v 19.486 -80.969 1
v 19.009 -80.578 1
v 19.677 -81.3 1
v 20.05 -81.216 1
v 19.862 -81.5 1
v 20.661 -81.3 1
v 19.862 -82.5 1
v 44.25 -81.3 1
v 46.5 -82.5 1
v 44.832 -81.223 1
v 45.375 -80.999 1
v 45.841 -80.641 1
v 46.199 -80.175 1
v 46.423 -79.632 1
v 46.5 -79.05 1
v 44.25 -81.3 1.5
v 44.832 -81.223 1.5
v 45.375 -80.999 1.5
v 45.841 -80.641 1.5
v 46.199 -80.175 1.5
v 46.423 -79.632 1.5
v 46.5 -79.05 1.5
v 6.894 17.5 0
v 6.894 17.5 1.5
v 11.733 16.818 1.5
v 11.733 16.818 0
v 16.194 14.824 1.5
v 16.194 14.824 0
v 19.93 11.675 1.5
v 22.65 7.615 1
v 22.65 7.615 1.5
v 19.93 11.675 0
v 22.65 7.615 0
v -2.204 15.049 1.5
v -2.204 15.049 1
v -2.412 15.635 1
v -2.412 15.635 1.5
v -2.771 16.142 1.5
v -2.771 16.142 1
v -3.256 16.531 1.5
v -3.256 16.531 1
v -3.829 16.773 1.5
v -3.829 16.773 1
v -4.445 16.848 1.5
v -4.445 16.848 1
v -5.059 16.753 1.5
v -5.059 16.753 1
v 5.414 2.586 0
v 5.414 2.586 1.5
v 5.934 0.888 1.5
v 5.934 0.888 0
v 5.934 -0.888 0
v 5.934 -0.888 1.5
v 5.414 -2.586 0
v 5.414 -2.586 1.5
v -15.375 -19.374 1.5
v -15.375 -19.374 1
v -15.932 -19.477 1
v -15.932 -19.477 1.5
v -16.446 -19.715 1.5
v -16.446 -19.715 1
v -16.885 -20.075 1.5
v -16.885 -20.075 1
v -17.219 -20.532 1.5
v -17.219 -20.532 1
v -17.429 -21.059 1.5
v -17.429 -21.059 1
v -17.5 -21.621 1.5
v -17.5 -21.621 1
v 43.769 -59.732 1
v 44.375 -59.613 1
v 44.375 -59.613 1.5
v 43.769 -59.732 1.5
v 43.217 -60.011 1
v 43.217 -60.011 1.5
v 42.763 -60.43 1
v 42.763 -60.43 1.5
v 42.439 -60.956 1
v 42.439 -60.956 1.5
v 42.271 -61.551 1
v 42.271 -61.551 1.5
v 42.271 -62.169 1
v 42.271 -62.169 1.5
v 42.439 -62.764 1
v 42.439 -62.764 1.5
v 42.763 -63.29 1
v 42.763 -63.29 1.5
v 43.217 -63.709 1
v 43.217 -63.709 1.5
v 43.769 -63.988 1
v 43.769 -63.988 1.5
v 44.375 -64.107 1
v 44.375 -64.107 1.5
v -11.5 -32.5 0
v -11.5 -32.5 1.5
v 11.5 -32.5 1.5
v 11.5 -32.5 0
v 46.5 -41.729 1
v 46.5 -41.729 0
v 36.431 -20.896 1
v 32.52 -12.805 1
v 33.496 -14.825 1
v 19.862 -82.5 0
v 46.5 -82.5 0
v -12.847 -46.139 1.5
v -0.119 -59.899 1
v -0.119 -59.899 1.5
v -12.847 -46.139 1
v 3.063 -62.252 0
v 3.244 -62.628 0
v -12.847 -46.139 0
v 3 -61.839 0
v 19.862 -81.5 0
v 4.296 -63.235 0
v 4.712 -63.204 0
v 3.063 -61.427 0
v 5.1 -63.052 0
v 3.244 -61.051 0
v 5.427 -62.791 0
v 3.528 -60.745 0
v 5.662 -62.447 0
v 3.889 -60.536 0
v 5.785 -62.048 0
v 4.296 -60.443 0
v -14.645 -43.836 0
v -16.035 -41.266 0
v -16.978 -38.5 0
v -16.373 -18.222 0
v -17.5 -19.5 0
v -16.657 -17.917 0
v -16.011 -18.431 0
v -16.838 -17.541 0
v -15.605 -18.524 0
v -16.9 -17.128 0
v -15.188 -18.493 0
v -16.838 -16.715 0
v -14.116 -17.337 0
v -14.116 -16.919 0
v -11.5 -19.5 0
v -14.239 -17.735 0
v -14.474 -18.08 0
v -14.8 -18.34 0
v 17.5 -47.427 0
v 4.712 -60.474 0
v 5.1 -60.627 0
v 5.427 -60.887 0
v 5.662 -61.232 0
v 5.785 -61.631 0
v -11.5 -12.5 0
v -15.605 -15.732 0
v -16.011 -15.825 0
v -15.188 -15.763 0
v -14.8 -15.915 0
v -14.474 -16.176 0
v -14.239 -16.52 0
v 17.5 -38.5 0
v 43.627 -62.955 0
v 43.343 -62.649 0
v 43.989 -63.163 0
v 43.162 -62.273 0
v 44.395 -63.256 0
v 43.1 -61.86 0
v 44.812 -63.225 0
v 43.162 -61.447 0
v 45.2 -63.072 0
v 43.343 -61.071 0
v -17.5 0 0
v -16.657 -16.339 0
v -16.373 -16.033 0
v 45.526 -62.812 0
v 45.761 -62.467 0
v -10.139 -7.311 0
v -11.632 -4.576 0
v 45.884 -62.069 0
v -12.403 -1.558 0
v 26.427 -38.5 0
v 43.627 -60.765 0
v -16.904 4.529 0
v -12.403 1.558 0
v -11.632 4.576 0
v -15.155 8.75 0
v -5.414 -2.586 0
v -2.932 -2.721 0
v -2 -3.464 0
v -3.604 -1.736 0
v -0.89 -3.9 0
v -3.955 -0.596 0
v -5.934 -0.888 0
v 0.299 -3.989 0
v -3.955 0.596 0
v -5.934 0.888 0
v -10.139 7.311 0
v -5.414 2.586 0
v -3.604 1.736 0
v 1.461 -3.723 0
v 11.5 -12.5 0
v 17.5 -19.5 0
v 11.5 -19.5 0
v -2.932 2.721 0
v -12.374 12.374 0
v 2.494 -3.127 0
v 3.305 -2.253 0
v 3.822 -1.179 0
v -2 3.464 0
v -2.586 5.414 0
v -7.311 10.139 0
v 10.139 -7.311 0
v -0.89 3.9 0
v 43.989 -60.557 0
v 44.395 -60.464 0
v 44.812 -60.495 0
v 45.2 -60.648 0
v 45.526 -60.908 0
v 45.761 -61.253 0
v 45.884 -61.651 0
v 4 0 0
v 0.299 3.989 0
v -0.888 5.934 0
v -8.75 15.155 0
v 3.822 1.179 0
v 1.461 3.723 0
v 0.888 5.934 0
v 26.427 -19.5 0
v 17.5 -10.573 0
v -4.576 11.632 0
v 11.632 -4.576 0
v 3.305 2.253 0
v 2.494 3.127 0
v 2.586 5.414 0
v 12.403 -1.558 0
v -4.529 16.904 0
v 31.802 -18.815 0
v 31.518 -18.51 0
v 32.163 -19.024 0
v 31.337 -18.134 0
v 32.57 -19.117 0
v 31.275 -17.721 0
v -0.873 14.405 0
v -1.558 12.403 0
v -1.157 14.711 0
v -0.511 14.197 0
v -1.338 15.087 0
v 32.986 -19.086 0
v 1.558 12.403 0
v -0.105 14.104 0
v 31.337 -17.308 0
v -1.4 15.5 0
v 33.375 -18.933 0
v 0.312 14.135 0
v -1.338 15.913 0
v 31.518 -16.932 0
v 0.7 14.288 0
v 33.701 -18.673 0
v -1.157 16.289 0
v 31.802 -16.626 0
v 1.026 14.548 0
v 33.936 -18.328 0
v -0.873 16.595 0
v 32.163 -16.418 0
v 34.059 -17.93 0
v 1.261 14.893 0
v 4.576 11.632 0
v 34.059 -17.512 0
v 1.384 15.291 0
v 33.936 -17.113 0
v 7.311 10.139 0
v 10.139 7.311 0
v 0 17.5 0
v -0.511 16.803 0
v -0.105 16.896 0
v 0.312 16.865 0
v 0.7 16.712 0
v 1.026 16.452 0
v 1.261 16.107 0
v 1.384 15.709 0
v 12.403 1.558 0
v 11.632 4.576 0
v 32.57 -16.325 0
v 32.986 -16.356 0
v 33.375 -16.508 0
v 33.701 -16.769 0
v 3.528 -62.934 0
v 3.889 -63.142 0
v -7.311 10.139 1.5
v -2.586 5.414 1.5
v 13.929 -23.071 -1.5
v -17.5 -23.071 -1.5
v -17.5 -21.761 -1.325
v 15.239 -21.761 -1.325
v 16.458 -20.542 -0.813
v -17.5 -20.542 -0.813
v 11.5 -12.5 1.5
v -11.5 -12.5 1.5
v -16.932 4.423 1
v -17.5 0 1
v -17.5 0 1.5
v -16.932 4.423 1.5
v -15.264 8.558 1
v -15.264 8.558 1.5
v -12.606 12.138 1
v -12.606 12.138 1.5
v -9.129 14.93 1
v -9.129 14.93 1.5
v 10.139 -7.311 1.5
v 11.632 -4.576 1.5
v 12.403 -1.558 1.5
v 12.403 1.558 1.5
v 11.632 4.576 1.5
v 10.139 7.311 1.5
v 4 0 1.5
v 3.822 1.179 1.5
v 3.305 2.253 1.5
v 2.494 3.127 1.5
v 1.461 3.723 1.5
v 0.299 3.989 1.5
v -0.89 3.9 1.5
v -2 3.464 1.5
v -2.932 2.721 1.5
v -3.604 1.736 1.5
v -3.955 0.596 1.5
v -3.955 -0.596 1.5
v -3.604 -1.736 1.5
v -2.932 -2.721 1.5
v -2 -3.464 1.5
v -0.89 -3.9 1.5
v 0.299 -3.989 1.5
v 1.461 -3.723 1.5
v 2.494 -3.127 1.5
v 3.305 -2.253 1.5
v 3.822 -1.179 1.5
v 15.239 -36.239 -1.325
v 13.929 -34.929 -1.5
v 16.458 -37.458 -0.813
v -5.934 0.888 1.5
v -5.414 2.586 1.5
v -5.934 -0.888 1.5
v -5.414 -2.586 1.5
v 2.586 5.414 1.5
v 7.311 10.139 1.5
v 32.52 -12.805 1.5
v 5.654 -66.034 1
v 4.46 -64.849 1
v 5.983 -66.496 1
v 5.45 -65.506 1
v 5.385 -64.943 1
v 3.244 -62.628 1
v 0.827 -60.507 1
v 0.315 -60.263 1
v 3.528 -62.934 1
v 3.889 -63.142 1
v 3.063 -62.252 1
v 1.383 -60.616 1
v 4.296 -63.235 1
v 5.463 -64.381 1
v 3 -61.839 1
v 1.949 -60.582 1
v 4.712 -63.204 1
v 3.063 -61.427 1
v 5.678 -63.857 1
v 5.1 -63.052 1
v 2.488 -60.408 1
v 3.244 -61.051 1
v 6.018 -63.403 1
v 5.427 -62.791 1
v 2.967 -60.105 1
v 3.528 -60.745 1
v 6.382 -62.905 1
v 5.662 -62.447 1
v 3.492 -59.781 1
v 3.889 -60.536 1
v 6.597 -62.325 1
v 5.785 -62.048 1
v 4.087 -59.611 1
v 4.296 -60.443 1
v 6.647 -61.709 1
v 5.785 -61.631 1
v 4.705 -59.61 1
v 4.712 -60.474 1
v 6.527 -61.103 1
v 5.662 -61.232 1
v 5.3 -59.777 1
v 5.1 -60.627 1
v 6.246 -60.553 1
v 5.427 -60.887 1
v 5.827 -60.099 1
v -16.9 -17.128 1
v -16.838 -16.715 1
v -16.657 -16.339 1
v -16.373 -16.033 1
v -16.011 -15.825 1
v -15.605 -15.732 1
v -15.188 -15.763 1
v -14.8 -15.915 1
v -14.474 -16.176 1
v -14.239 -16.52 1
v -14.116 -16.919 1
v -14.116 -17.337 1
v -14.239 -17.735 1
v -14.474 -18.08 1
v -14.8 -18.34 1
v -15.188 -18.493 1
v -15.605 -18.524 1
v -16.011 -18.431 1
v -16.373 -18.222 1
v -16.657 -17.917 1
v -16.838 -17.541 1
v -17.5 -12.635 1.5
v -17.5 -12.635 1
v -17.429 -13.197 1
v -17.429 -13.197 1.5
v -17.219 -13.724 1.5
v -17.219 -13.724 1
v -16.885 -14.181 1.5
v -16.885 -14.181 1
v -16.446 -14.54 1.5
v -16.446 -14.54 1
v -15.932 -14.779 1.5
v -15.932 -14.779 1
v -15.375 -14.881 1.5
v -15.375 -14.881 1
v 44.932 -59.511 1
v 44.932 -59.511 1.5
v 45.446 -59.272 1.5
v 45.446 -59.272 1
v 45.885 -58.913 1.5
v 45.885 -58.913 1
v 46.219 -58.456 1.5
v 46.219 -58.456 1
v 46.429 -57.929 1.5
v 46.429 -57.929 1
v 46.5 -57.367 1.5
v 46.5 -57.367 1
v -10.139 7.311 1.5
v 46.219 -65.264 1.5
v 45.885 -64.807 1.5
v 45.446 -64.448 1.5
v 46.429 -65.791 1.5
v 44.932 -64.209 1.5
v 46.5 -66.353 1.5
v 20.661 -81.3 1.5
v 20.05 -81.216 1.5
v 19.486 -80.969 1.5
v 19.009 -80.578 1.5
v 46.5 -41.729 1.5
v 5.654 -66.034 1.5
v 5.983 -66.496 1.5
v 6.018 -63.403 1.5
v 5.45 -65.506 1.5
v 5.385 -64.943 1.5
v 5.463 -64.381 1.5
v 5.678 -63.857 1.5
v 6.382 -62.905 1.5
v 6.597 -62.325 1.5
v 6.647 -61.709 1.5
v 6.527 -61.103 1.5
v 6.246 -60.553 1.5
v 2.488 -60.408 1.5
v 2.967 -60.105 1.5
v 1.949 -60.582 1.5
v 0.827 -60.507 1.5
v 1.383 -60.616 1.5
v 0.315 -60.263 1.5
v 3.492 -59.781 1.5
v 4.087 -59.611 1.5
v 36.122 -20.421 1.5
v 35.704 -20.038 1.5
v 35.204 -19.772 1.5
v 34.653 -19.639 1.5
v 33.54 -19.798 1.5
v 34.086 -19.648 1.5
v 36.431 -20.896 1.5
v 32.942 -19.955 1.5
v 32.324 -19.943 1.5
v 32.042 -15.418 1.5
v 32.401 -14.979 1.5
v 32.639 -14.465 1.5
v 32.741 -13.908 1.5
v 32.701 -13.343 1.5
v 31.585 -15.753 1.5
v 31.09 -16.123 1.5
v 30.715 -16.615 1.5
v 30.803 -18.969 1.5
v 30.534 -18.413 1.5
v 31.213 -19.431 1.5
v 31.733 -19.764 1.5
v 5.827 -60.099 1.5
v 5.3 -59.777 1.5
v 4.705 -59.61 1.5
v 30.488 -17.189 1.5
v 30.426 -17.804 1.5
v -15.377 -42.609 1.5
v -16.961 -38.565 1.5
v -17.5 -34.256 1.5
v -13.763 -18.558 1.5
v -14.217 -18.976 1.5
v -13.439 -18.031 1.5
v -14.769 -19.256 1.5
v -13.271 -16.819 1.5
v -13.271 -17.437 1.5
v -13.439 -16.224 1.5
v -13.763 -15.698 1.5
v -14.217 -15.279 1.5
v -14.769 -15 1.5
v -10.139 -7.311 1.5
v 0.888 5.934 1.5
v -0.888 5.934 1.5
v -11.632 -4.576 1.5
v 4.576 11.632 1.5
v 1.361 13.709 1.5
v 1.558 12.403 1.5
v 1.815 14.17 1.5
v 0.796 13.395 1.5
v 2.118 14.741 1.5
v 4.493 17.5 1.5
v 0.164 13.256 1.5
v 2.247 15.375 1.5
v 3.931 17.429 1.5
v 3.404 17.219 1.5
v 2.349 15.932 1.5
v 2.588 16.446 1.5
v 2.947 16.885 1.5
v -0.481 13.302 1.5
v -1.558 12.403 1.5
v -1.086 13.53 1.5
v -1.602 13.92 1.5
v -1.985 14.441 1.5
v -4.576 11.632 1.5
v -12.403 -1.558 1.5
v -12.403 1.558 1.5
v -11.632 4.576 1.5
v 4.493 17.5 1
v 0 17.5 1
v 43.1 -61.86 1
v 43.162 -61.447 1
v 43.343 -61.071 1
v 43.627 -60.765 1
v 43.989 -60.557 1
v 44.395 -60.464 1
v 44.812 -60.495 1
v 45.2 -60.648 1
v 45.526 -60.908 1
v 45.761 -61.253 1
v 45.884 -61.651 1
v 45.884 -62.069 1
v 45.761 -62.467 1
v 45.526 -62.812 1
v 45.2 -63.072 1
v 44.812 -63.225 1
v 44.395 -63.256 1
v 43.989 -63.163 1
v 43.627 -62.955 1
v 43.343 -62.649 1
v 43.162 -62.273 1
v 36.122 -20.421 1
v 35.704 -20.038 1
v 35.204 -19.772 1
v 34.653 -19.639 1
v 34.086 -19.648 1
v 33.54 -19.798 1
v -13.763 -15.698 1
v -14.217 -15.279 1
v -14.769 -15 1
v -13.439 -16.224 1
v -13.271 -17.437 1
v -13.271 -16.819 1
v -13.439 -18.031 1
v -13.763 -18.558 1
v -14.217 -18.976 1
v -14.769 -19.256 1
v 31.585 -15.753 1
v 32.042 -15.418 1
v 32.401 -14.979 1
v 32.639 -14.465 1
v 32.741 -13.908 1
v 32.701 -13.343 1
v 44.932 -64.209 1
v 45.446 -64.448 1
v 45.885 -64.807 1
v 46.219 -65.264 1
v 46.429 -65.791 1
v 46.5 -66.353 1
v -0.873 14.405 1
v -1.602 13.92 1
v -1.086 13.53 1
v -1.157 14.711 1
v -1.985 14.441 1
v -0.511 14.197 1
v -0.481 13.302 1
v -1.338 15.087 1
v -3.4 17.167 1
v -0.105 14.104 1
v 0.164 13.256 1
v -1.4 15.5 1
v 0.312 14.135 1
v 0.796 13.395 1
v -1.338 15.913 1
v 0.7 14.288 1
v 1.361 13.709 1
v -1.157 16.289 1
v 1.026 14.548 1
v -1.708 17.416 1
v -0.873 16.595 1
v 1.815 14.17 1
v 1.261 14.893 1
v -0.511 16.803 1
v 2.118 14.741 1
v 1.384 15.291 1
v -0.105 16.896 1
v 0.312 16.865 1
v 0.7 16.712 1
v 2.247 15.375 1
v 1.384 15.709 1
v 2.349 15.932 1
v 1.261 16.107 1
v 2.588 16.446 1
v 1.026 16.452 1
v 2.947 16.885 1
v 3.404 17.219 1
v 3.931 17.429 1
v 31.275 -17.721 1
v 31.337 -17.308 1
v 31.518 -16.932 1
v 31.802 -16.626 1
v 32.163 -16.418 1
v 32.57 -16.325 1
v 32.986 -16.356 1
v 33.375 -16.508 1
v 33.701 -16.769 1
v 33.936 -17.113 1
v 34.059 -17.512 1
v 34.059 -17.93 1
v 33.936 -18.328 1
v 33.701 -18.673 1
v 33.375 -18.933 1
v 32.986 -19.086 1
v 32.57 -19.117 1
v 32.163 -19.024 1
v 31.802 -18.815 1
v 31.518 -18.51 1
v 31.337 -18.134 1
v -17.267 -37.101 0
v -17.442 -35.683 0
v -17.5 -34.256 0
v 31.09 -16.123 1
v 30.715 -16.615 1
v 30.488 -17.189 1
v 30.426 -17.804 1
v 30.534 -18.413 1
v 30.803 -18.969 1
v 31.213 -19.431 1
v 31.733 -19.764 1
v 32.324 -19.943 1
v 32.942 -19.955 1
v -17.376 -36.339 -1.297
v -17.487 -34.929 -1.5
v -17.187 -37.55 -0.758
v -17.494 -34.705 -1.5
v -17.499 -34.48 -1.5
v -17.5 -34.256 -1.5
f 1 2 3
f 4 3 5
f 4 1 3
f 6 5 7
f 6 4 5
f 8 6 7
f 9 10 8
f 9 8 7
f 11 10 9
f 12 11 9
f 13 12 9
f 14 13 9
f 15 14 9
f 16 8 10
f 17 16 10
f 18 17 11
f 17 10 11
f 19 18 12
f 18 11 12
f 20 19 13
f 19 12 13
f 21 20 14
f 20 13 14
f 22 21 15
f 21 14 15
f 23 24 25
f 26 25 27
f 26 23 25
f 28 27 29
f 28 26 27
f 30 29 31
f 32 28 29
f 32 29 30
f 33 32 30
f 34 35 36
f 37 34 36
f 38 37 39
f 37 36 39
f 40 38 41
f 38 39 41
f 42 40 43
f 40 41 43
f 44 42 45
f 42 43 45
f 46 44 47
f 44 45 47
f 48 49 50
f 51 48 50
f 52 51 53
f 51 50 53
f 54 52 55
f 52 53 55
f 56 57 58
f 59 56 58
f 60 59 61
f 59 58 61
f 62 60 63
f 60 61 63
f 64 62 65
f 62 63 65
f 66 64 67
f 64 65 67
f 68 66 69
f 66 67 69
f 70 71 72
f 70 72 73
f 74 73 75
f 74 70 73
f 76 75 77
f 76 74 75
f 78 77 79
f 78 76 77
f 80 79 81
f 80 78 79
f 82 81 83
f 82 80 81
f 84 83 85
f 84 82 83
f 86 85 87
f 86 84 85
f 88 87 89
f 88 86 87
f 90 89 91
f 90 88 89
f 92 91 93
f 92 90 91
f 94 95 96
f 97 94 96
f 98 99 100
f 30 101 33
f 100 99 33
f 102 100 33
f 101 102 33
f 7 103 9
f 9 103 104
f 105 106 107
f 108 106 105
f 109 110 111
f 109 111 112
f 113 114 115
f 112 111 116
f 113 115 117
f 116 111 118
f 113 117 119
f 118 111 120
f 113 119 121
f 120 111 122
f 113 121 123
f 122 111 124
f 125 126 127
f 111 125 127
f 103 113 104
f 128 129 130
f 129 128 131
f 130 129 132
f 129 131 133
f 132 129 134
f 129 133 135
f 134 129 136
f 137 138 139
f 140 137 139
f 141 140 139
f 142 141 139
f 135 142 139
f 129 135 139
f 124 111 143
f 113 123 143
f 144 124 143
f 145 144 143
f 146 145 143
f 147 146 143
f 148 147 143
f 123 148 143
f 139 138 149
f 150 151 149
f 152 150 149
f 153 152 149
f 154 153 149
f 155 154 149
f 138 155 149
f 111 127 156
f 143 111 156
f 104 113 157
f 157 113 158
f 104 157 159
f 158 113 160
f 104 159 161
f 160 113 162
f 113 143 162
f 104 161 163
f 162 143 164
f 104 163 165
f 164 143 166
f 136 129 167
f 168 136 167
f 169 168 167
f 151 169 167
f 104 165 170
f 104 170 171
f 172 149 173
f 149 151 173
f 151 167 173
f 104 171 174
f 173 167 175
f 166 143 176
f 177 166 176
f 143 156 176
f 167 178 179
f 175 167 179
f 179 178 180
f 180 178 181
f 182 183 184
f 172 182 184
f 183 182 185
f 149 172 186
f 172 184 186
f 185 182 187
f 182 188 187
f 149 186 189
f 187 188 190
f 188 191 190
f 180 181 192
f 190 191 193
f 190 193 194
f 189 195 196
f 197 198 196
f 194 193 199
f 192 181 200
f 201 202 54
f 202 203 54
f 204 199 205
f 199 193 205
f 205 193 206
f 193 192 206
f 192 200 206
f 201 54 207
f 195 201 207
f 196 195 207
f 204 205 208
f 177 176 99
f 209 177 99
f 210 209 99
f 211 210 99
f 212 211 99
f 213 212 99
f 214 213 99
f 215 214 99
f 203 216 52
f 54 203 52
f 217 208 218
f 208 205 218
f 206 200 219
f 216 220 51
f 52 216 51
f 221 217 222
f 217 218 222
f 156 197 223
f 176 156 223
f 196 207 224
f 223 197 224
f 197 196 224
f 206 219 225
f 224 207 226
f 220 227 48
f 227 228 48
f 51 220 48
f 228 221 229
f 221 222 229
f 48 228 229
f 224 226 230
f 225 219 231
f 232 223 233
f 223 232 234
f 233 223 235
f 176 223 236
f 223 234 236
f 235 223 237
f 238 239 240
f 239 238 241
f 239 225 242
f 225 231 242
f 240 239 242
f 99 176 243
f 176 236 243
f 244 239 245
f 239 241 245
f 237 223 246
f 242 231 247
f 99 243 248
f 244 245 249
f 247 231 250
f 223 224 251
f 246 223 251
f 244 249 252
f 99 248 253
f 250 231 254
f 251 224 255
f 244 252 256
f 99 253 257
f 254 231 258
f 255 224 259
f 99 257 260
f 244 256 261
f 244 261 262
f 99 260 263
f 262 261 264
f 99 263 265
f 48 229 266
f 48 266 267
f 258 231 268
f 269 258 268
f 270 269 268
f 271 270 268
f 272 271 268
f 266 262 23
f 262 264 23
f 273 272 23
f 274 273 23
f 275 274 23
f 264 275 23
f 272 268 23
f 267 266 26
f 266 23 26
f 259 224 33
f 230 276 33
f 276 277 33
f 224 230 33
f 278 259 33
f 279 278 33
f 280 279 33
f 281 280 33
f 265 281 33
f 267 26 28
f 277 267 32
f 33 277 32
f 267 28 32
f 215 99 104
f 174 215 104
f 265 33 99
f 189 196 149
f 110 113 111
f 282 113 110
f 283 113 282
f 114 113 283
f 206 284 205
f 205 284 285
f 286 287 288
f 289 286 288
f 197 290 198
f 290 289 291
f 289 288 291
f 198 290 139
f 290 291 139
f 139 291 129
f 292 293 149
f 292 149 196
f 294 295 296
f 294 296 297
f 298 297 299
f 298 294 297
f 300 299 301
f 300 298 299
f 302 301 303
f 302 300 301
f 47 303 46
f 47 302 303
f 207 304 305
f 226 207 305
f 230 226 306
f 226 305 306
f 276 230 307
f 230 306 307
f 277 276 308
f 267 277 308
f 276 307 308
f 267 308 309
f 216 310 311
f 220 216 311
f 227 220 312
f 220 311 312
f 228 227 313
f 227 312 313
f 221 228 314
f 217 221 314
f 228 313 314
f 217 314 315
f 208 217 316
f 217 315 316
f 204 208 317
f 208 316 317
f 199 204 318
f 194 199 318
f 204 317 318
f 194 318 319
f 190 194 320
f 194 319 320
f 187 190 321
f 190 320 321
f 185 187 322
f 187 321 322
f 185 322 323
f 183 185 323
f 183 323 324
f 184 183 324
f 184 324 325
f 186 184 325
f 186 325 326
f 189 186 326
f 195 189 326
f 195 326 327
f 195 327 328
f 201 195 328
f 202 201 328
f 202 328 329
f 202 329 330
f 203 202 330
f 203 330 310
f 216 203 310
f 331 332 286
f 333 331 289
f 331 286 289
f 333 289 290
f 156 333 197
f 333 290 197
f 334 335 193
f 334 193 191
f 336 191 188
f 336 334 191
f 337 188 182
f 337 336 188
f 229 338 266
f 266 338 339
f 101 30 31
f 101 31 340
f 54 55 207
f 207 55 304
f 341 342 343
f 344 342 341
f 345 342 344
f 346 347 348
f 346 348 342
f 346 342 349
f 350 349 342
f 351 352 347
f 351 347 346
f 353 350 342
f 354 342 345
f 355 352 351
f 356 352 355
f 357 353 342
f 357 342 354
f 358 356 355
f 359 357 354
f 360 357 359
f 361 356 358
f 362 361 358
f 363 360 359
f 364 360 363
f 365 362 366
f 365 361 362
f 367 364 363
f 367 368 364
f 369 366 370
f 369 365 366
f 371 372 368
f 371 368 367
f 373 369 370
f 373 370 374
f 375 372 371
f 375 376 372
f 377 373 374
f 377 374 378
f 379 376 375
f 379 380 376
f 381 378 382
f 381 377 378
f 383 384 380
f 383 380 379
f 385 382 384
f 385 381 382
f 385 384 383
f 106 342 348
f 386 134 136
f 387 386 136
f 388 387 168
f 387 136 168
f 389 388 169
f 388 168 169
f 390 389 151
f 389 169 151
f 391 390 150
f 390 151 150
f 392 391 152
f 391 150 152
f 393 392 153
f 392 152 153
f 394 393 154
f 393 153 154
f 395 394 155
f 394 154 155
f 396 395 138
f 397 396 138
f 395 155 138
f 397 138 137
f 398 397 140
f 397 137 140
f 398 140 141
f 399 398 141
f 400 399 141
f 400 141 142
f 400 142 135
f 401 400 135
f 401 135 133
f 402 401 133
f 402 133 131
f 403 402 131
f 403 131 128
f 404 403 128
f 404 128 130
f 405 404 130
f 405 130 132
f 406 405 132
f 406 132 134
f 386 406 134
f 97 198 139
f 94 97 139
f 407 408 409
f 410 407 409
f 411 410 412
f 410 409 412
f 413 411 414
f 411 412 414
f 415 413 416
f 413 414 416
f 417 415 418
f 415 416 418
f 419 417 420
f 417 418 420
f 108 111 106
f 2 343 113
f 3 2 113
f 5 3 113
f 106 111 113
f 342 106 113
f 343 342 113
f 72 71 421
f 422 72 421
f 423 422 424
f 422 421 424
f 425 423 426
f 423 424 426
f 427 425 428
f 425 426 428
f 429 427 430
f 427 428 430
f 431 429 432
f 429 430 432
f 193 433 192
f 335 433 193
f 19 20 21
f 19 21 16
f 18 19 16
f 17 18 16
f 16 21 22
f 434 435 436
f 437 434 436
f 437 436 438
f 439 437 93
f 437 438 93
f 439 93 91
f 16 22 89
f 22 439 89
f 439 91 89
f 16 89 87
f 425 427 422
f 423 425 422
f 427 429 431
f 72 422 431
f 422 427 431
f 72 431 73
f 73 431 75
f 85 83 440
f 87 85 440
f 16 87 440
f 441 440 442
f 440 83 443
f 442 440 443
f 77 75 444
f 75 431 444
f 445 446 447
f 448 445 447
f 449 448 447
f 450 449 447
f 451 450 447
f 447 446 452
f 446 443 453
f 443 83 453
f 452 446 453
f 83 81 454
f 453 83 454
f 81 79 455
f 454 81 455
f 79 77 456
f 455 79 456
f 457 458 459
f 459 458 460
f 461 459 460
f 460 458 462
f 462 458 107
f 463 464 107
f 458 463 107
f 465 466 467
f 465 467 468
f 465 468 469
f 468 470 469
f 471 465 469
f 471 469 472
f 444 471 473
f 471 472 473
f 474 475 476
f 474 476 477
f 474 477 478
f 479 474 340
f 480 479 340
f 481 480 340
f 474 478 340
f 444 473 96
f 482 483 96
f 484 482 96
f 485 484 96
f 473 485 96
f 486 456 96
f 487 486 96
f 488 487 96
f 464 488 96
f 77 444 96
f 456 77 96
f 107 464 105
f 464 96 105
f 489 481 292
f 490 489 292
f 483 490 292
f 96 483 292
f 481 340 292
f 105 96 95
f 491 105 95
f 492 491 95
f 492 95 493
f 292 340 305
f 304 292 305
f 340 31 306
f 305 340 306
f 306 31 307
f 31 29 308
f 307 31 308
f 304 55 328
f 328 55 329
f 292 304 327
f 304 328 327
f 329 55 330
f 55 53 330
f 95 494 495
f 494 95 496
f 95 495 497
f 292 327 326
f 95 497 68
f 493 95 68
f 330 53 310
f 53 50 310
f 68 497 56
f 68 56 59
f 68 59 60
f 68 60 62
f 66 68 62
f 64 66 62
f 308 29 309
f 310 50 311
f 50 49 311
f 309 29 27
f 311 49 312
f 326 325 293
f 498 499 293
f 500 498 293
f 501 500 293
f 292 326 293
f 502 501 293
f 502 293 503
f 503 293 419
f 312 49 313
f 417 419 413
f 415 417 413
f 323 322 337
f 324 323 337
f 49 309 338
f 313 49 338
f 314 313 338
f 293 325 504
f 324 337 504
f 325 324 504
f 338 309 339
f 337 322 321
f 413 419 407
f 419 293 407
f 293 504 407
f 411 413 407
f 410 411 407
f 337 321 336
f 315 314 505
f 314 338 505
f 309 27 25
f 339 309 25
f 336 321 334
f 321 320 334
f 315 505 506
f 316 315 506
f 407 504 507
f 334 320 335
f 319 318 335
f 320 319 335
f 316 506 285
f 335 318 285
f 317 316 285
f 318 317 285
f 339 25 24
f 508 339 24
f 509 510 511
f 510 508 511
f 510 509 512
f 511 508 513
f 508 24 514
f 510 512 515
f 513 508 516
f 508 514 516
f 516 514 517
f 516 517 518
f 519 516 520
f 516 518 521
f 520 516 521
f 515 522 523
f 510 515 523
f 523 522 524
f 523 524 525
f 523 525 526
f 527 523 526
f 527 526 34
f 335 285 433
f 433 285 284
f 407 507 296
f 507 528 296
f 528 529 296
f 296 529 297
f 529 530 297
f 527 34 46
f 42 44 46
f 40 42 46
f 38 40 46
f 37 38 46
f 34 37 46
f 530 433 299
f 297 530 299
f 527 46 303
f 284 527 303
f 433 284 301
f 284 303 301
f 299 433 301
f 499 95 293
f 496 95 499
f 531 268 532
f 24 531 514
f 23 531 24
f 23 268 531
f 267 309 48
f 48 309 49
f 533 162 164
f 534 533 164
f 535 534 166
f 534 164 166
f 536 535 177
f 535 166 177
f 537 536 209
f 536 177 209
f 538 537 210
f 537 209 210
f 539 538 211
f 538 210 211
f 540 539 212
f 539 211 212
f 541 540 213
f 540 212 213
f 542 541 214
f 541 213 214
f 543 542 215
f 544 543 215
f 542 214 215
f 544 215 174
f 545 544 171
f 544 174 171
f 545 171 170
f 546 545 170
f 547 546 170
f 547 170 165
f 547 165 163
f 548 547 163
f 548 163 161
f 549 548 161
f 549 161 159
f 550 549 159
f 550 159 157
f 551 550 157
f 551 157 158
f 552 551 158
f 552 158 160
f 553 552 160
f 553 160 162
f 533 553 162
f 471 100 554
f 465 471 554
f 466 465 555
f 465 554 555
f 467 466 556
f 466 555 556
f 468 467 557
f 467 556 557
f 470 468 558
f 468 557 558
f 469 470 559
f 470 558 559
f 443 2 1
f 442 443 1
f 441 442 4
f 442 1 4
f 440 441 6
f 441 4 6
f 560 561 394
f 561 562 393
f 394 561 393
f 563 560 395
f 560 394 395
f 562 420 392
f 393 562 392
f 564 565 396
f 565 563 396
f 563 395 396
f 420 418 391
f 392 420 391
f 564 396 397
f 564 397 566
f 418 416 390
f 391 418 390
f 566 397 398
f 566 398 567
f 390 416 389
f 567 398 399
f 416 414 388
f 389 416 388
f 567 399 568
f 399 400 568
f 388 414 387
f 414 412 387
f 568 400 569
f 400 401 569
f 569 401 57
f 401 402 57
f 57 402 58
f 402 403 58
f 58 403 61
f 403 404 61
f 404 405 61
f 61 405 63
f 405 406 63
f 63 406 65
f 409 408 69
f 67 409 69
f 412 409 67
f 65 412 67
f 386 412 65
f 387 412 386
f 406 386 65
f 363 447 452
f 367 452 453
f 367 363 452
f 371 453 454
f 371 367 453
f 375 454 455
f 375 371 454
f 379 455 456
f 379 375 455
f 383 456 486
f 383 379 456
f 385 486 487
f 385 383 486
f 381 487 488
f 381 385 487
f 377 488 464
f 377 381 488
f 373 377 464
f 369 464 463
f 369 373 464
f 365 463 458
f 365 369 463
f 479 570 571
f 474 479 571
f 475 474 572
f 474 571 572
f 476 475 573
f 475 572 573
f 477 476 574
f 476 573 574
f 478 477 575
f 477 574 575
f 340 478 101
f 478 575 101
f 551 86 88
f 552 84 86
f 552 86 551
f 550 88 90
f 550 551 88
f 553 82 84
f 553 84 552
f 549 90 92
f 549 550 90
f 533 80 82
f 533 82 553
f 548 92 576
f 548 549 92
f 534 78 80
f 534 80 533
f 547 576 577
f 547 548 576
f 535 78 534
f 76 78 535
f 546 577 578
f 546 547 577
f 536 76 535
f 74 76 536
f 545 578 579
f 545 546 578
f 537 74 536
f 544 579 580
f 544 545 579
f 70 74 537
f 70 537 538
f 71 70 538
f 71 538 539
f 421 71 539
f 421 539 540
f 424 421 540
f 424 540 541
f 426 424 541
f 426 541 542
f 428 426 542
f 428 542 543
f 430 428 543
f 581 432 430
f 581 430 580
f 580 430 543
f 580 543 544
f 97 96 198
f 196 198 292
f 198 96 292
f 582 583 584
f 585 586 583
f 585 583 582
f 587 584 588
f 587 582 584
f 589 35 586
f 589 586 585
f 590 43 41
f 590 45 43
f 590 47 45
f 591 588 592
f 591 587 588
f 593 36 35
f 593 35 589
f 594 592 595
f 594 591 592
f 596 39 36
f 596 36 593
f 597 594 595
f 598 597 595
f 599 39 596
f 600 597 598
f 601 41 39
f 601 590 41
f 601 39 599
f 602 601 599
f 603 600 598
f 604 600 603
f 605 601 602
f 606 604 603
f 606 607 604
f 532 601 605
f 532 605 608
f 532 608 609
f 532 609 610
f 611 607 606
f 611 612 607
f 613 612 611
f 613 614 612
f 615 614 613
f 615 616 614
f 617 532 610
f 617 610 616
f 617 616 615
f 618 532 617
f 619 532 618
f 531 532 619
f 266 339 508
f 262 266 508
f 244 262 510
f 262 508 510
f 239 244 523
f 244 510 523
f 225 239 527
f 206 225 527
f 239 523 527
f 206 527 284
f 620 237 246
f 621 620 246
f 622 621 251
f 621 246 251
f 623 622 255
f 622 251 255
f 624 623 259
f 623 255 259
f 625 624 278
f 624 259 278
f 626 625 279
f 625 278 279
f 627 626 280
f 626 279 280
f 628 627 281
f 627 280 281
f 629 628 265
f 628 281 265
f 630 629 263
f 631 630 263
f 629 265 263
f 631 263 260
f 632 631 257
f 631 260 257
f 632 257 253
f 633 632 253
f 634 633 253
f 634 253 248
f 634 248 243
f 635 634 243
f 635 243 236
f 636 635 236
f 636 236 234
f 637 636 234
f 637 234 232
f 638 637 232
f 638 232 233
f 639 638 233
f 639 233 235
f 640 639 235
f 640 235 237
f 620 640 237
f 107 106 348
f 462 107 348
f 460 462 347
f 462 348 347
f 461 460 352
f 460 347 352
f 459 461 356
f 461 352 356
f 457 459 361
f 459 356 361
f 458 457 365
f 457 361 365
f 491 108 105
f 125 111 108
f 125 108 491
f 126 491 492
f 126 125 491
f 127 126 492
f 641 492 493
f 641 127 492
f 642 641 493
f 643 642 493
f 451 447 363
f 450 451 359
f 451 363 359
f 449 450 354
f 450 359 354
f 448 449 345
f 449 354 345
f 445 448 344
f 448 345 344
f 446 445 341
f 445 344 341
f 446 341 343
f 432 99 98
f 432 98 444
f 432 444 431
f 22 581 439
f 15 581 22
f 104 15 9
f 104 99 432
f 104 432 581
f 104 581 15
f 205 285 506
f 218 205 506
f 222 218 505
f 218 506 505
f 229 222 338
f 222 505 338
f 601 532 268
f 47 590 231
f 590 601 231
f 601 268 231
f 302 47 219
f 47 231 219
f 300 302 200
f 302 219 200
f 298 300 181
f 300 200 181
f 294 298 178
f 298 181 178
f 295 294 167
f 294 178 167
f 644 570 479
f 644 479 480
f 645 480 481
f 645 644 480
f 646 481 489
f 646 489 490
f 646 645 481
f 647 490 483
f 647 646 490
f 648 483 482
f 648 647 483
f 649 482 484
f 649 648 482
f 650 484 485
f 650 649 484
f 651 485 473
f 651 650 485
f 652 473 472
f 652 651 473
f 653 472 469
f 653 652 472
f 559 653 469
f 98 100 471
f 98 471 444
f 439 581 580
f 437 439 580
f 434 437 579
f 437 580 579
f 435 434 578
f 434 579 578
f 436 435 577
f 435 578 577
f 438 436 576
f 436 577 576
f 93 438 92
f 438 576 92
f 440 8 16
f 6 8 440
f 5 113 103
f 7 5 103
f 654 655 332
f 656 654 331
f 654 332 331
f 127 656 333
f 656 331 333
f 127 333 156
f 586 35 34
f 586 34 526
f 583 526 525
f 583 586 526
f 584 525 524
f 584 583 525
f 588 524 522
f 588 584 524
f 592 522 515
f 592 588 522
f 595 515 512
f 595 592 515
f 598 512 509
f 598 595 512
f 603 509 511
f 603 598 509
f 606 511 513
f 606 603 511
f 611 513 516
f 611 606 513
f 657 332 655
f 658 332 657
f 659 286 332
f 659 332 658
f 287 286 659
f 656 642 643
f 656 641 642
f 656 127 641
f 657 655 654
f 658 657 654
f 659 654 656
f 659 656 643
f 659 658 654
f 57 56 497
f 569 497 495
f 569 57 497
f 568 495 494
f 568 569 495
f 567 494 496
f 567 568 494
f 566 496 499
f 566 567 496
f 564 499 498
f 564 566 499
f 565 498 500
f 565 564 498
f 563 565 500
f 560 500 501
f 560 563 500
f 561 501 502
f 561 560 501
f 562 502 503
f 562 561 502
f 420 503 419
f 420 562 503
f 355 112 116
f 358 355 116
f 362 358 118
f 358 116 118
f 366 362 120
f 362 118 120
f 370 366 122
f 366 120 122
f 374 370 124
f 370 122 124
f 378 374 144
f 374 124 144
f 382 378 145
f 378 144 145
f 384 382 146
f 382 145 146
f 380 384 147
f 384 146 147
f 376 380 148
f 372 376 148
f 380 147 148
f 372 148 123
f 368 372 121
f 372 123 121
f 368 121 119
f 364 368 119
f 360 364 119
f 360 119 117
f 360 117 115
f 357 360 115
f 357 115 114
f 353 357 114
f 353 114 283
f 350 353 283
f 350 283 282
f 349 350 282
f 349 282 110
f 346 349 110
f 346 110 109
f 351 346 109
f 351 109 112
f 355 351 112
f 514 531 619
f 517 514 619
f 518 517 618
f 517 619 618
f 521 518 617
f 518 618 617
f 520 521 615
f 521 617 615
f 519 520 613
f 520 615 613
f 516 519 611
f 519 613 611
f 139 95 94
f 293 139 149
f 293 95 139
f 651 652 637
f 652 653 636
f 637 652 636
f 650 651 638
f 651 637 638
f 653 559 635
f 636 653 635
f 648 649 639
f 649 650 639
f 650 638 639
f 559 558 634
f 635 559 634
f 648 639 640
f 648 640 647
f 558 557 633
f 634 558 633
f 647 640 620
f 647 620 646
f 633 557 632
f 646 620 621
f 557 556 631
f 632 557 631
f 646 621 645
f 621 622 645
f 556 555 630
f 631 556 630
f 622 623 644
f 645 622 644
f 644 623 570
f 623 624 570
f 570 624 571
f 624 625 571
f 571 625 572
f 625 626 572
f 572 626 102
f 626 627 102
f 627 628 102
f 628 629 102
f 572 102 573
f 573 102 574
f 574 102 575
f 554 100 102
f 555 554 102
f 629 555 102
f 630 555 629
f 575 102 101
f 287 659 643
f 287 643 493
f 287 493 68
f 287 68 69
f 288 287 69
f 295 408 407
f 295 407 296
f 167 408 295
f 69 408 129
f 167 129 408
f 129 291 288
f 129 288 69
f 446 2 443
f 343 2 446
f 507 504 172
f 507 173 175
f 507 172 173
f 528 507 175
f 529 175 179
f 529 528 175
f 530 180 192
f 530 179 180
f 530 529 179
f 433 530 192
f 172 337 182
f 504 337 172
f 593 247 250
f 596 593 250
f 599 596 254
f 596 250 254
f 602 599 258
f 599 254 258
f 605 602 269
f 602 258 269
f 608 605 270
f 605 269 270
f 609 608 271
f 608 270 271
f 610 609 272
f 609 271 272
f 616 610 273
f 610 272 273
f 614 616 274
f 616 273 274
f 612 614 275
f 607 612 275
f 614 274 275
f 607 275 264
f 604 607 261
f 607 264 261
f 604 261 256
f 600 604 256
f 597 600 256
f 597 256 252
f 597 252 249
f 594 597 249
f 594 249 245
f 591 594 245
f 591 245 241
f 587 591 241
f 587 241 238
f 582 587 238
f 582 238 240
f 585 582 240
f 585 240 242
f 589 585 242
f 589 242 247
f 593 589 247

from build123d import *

# Parameters (mm, degrees)
EXTRUDE_1_DEPTH     = 1
EXTRUDE_2_DEPTH     = 0.5
FILLET_1_R          = 2.25
CUT_EXTRUDE_1_REACH = 96.714
SKETCH_3_R          = 1.4
CUT_EXTRUDE_2_REACH = 96.714
SKETCH_4_R          = 4
SKETCH_4_W          = 23
SKETCH_4_H          = 20
EXTRUDE_START       = 1.5
EXTRUDE_3_DEPTH     = 1.5
FILLET_2_R          = 5


with BuildPart() as part:
    # 스케치1 → 보스-돌출1 (new body)
    with BuildSketch(Plane.XY):
        with BuildLine():
            Line((46.5, -82.5), (46.5, -41.72899408))
            Line((46.5, -41.72899408), (22.650184607, 7.615451559))
            ThreePointArc((22.650184607, 7.615451559), (16.194067118, 14.824311152), (6.894077933, 17.5))
            Line((6.894077933, 17.5), (0, 17.5))
            ThreePointArc((0, 17.5), (-12.374368671, 12.374368671), (-17.5, 0))
            Line((-17.5, 0), (-17.5, -34.255734548))
            ThreePointArc((-17.5, -34.255734548), (-16.295213306, -40.636645401), (-12.846740193, -46.138969227))
            Line((-12.846740193, -46.138969227), (19.862213273, -81.5))
            Line((19.862213273, -81.5), (19.862213273, -82.5))
            Line((19.862213273, -82.5), (46.5, -82.5))
        make_face()
    extrude(amount=EXTRUDE_1_DEPTH)

    # 스케치2 → 보스-돌출2 (add)
    with BuildSketch(Plane(origin=(0, 0, 1), x_dir=(-1, 0, 0), z_dir=(0, 0, -1))):
        with BuildLine():
            Line((-46.5, -81.3), (-19.677213273, -81.3))
            Line((-19.677213273, -81.3), (-4.460038224, -64.848999948))
            Line((-4.460038224, -64.848999948), (-5.928237104, -63.490915985))
            ThreePointArc((-5.928237104, -63.490915985), (-6.052116384, -60.311347787), (-2.872548186, -60.187468507))
            Line((-2.872548186, -60.187468507), (-1.404349307, -61.54555247))
            Line((-1.404349307, -61.54555247), (12.846740193, -46.138969227))
            ThreePointArc((12.846740193, -46.138969227), (16.295213306, -40.636645401), (17.5, -34.255734548))
            Line((17.5, -34.255734548), (17.5, -19.377867274))
            Line((17.5, -19.377867274), (15.5, -19.377867274))
            ThreePointArc((15.5, -19.377867274), (13.25, -17.127867274), (15.5, -14.877867274))
            Line((15.5, -14.877867274), (17.5, -14.877867274))
            Line((17.5, -14.877867274), (17.5, 0))
            ThreePointArc((17.5, 0), (13.145816825, 11.551515052), (2.25, 17.354754392))
            Line((2.25, 17.354754392), (2.25, 15.5))
            ThreePointArc((2.25, 15.5), (0, 13.25), (-2.25, 15.5))
            Line((-2.25, 15.5), (-2.25, 17.5))
            Line((-2.25, 17.5), (-6.894077933, 17.5))
            ThreePointArc((-6.894077933, 17.5), (-16.194067118, 14.824311152), (-22.650184607, 7.615451559))
            Line((-22.650184607, 7.615451559), (-33.49631177, -14.824811536))
            Line((-33.49631177, -14.824811536), (-31.695613865, -15.695148857))
            ThreePointArc((-31.695613865, -15.695148857), (-30.648958207, -18.700063487), (-33.653872837, -19.746719145))
            Line((-33.653872837, -19.746719145), (-35.454570743, -18.876381824))
            Line((-35.454570743, -18.876381824), (-46.5, -41.72899408))
            Line((-46.5, -41.72899408), (-46.5, -59.61))
            Line((-46.5, -59.61), (-44.5, -59.61))
            ThreePointArc((-44.5, -59.61), (-42.25, -61.86), (-44.5, -64.11))
            Line((-44.5, -64.11), (-46.5, -64.11))
            Line((-46.5, -64.11), (-46.5, -81.3))
        make_face()
    extrude(amount=-EXTRUDE_2_DEPTH)

    # 필렛1
    # the kernel refuses this fillet: 2.25 mm, written as the material it takes off along each edge
    with BuildSketch(Plane(origin=(-17.5, -14.877867274, 1), x_dir=(0, 1, 0), z_dir=(0, 0, 1)), Plane(origin=(35.454570743, -18.876381824, 1), x_dir=(0.4351686605402659, -0.9003489528419473, 0), z_dir=(0, 0, 1)), Plane(origin=(46.5, -64.11, 1), x_dir=(0, -1, 0), z_dir=(0, 0, 1)), Plane(origin=(1.404349307, -61.54555247, 1), x_dir=(-0.6790419816174302, 0.7340994395864046, 0), z_dir=(0, 0, 1))) as fillet_1_piece_1:
        with BuildLine():
            CenterArc((2.243050189, -2.25), FILLET_1_R, 90, 86.815261463)
            Line((-0.003474906, -2.125), (-0.228127415, -2.1125))
            ThreePointArc((-0.228127415, -2.1125), (-0.225, -2), (-0.225, 0))
            Line((-0.225, 0), (0, 0.225))
            Line((0, 0.225), (2.243050189, 0.225))
            Line((2.243050189, 0.225), (2.243050189, 0))
        make_face()
    extrude(amount=6.107625472, mode=Mode.SUBTRACT)
    with BuildSketch(Plane(origin=(-17.5, -19.377867274, 1), x_dir=(0, -1, 0), z_dir=(0, 0, 1)), Plane(origin=(33.49631177, -14.824811536, 1), x_dir=(-0.4351686605402757, 0.9003489528419424, 0), z_dir=(0, 0, 1)), Plane(origin=(46.5, -59.61, 1), x_dir=(0, 1, 0), z_dir=(0, 0, 1)), Plane(origin=(4.460038224, -64.848999948, 1), x_dir=(0.679041981617429, -0.7340994395864059, 0), z_dir=(0, 0, 1))) as fillet_1_piece_2:
        with BuildLine():
            CenterArc((2.243050189, 2.25), FILLET_1_R, 183.184738537, 86.815261463)
            Line((-0.003474906, 2.125), (-0.228127415, 2.1125))
            ThreePointArc((-0.228127415, 2.1125), (-0.225, 2), (-0.225, 0))
            Line((-0.225, 0), (0, -0.225))
            Line((0, -0.225), (2.243050189, -0.225))
            Line((2.243050189, -0.225), (2.243050189, 0))
        make_face()
    extrude(amount=6.107625472, mode=Mode.SUBTRACT)
    with BuildSketch(Plane(origin=(2.25, 17.5, 1), x_dir=(-0.0016352474835574222, -0.99999866298194, 0), z_dir=(0, 0, 1))) as fillet_1_piece_3:
        with BuildLine():
            CenterArc((2.24632905, 2.246726497), FILLET_1_R, 180.093692821, 86.815261463)
            Line((-0.003667942, 2.24304719), (-0.228667641, 2.242679259))
            Line((-0.228667641, 2.242679259), (-0.224999699, -0.000367931))
            Line((-0.224999699, -0.000367931), (0.000367931, -0.224999699))
            ThreePointArc((0.000367931, -0.224999699), (2.000365257, -0.221729204), (2.11287022, -0.22467265))
            Line((2.11287022, -0.22467265), (2.125002841, 0))
        make_face()
    extrude(amount=6.107625472, mode=Mode.SUBTRACT)
    with BuildSketch(Plane(origin=(-2.25, 17.354754392, 1), x_dir=(-0.9777990320246813, -0.20954487102192756, 0), z_dir=(0, 0, 1))) as fillet_1_piece_4:
        with BuildLine():
            CenterArc((2.688404361, 2.242406315), FILLET_1_R, 179.456997301, 95.251636128)
            Line((0.438505404, 2.263729662), (0.213515509, 2.265861997))
            ThreePointArc((0.213515509, 2.265861997), (0.168649488, 1.860724645), (-0.220004782, 0.047147596))
            Line((-0.220004782, 0.047147596), (-0.018469954, -0.224240631))
            ThreePointArc((-0.018469954, -0.224240631), (1.436551949, -0.284061995), (2.891573851, -0.224240631))
            Line((2.891573851, -0.224240631), (2.873103897, 0))
        make_face()
    extrude(amount=7.682759743, mode=Mode.SUBTRACT)
    with BuildSketch(Plane(origin=(19.677213273, -81.3, 1), x_dir=(-0.6790419816174232, 0.7340994395864112, 0), z_dir=(0, 0, 1))) as fillet_1_piece_5:
        with BuildLine():
            CenterArc((FILLET_1_R * 0.437213272583, -FILLET_1_R), FILLET_1_R, 90, 47.231174608)
            Line((-FILLET_1_R * 0.296886167004, -FILLET_1_R * 0.320958018383), (0, 0))
            Line((0, 0), (FILLET_1_R * 0.437213272583, 0))
        make_face()
    extrude(amount=2.959324658, mode=Mode.SUBTRACT)
    with BuildSketch(Plane(origin=(46.5, -81.3, 1), x_dir=(0, 1, 0), z_dir=(0, 0, 1))) as fillet_1_piece_6:
        with BuildLine():
            CenterArc((FILLET_1_R, FILLET_1_R), FILLET_1_R, 180, 90)
            Line((0, FILLET_1_R), (0, 0))
            Line((0, 0), (FILLET_1_R, 0))
        make_face()
    extrude(amount=6.125, mode=Mode.SUBTRACT)

    # 스케치3 → 컷-돌출1 (cut, up to next)
    with BuildSketch(Plane(origin=(0, 0, 0), x_dir=(-1, 0, 0), z_dir=(0, 0, -1)), mode=Mode.PRIVATE) as cut_extrude_1_sk1:
        with Locations((0, 15.5)):
            Circle(SKETCH_3_R)
    cut_extrude_1_tool1 = extrude(cut_extrude_1_sk1.sketch, amount=-CUT_EXTRUDE_1_REACH, mode=Mode.PRIVATE) & part.part
    # 스케치3 → 컷-돌출1 (cut, up to next)
    with BuildSketch(Plane(origin=(0, 0, 0), x_dir=(-1, 0, 0), z_dir=(0, 0, -1)), mode=Mode.PRIVATE) as cut_extrude_1_sk2:
        with Locations((15.5, -17.127867274)):
            Circle(SKETCH_3_R)
    cut_extrude_1_tool2 = extrude(cut_extrude_1_sk2.sketch, amount=-CUT_EXTRUDE_1_REACH, mode=Mode.PRIVATE) & part.part
    # 스케치3 → 컷-돌출1 (cut, up to next)
    with BuildSketch(Plane(origin=(0, 0, 0), x_dir=(-1, 0, 0), z_dir=(0, 0, -1)), mode=Mode.PRIVATE) as cut_extrude_1_sk3:
        with Locations((-32.674743351, -17.720934001)):
            Circle(SKETCH_3_R)
    cut_extrude_1_tool3 = extrude(cut_extrude_1_sk3.sketch, amount=-CUT_EXTRUDE_1_REACH, mode=Mode.PRIVATE) & part.part
    # 스케치3 → 컷-돌출1 (cut, up to next)
    with BuildSketch(Plane(origin=(0, 0, 0), x_dir=(-1, 0, 0), z_dir=(0, 0, -1)), mode=Mode.PRIVATE) as cut_extrude_1_sk4:
        with Locations((-44.5, -61.86)):
            Circle(SKETCH_3_R)
    cut_extrude_1_tool4 = extrude(cut_extrude_1_sk4.sketch, amount=-CUT_EXTRUDE_1_REACH, mode=Mode.PRIVATE) & part.part
    # 스케치3 → 컷-돌출1 (cut, up to next)
    with BuildSketch(Plane(origin=(0, 0, 0), x_dir=(-1, 0, 0), z_dir=(0, 0, -1)), mode=Mode.PRIVATE) as cut_extrude_1_sk5:
        with Locations((-4.400392645, -61.839192246)):
            Circle(SKETCH_3_R)
    cut_extrude_1_tool5 = extrude(cut_extrude_1_sk5.sketch, amount=-CUT_EXTRUDE_1_REACH, mode=Mode.PRIVATE) & part.part
    add(cut_extrude_1_tool1.solids().sort_by_distance((0, 15.5, 0))[0], mode=Mode.SUBTRACT)
    add(cut_extrude_1_tool2.solids().sort_by_distance((-15.5, -17.127867, 0))[0], mode=Mode.SUBTRACT)
    add(cut_extrude_1_tool3.solids().sort_by_distance((32.674743, -17.720934, 0))[0], mode=Mode.SUBTRACT)
    add(cut_extrude_1_tool4.solids().sort_by_distance((44.5, -61.86, 0))[0], mode=Mode.SUBTRACT)
    add(cut_extrude_1_tool5.solids().sort_by_distance((4.400393, -61.839192, 0))[0], mode=Mode.SUBTRACT)

    # 스케치4 → 컷-돌출2 (cut, up to next)
    with BuildSketch(Plane.XY.offset(1.5), mode=Mode.PRIVATE) as cut_extrude_2_sk1:
        Circle(SKETCH_4_R)
    cut_extrude_2_tool1 = extrude(cut_extrude_2_sk1.sketch, amount=-CUT_EXTRUDE_2_REACH, mode=Mode.PRIVATE) & part.part
    # 스케치4 → 컷-돌출2 (cut, up to next)
    with BuildSketch(Plane.XY.offset(1.5), mode=Mode.PRIVATE) as cut_extrude_2_sk2:
        with Locations((0, -22.5)):
            Rectangle(SKETCH_4_W, SKETCH_4_H)
    cut_extrude_2_tool2 = extrude(cut_extrude_2_sk2.sketch, amount=-CUT_EXTRUDE_2_REACH, mode=Mode.PRIVATE) & part.part
    # 스케치4 → 컷-돌출2 (cut, up to next)
    with BuildSketch(Plane.XY.offset(1.5), mode=Mode.PRIVATE) as cut_extrude_2_sk3:
        with BuildLine():
            Line((-5.414213562, -2.585786438), (-10.139177746, -7.310750621))
            ThreePointArc((-10.139177746, -7.310750621), (-12.5, 0), (-10.139177746, 7.310750621))
            Line((-10.139177746, 7.310750621), (-5.414213562, 2.585786438))
            ThreePointArc((-5.414213562, 2.585786438), (-6, 0), (-5.414213562, -2.585786438))
        make_face()
    cut_extrude_2_tool3 = extrude(cut_extrude_2_sk3.sketch, amount=-CUT_EXTRUDE_2_REACH, mode=Mode.PRIVATE) & part.part
    # 스케치4 → 컷-돌출2 (cut, up to next)
    with BuildSketch(Plane.XY.offset(1.5), mode=Mode.PRIVATE) as cut_extrude_2_sk4:
        with BuildLine():
            Line((5.414213562, -2.585786438), (10.139177746, -7.310750621))
            ThreePointArc((10.139177746, -7.310750621), (12.5, 0), (10.139177746, 7.310750621))
            Line((10.139177746, 7.310750621), (5.414213562, 2.585786438))
            ThreePointArc((5.414213562, 2.585786438), (6, 0), (5.414213562, -2.585786438))
        make_face()
    cut_extrude_2_tool4 = extrude(cut_extrude_2_sk4.sketch, amount=-CUT_EXTRUDE_2_REACH, mode=Mode.PRIVATE) & part.part
    # 스케치4 → 컷-돌출2 (cut, up to next)
    with BuildSketch(Plane.XY.offset(1.5), mode=Mode.PRIVATE) as cut_extrude_2_sk5:
        with BuildLine():
            Line((2.585786438, 5.414213562), (7.310750621, 10.139177746))
            ThreePointArc((7.310750621, 10.139177746), (0, 12.5), (-7.310750621, 10.139177746))
            Line((-7.310750621, 10.139177746), (-2.585786438, 5.414213562))
            ThreePointArc((-2.585786438, 5.414213562), (0, 6), (2.585786438, 5.414213562))
        make_face()
    cut_extrude_2_tool5 = extrude(cut_extrude_2_sk5.sketch, amount=-CUT_EXTRUDE_2_REACH, mode=Mode.PRIVATE) & part.part
    add(cut_extrude_2_tool1.solids().sort_by_distance((0, 0, 1.5))[0], mode=Mode.SUBTRACT)
    add(cut_extrude_2_tool2.solids().sort_by_distance((0, -22.5, 1.5))[0], mode=Mode.SUBTRACT)
    add(cut_extrude_2_tool3.solids().sort_by_distance((-9.239512, 0, 1.5))[0], mode=Mode.SUBTRACT)
    add(cut_extrude_2_tool4.solids().sort_by_distance((9.239512, 0, 1.5))[0], mode=Mode.SUBTRACT)
    add(cut_extrude_2_tool5.solids().sort_by_distance((0, 9.239512, 1.5))[0], mode=Mode.SUBTRACT)

    # 스케치6 → 보스-돌출3 (add)
    with BuildSketch(Plane(origin=(0, 0, 0), x_dir=(-1, 0, 0), z_dir=(0, 0, -1)).offset(EXTRUDE_START)):
        with BuildLine():
            Line((17.5, -19.5), (-17.5, -19.5))
            Line((-17.5, -19.5), (-17.5, -38.5))
            Line((-17.5, -38.5), (16.977520749, -38.5))
            ThreePointArc((16.977520749, -38.5), (17.368889042, -36.393886425), (17.5, -34.255734548))
            Line((17.5, -34.255734548), (17.5, -19.5))
        make_face()
    extrude(amount=-EXTRUDE_3_DEPTH)

    # 필렛2
    # the kernel refuses this fillet: 5 mm, written as the material it takes off along each edge
    with BuildSketch(Plane(origin=(-26.426785536, -19.5, -1.5), x_dir=(0, 0, 1), z_dir=(1, 0, 0))) as fillet_2_piece_1:
        with BuildLine():
            CenterArc((5, 3.570714214), FILLET_2_R, 180, 45.572995999)
            Line((0, 3.570714214), (-0.1, 3.570714214))
            Line((-0.1, 3.570714214), (-0.1, 0))
            Line((-0.1, 0), (0, -0.1))
            ThreePointArc((0, -0.1), (0.75, -0.1), (1.43, -0.071414284))
            Line((1.43, -0.071414284), (1.5, 0))
        make_face()
    extrude(amount=52.853571071, mode=Mode.SUBTRACT)
    with BuildSketch(Plane(origin=(17.5, -10.573214464, -1.5), x_dir=(0, 0, 1), z_dir=(0, -1, 0))) as fillet_2_piece_2:
        with BuildLine():
            CenterArc((5, 3.570714214), FILLET_2_R, 180, 45.572995999)
            Line((0, 3.570714214), (-0.1, 3.570714214))
            Line((-0.1, 3.570714214), (-0.1, 0))
            Line((-0.1, 0), (0, -0.1))
            ThreePointArc((0, -0.1), (0.75, -0.1), (1.43, -0.071414284))
            Line((1.43, -0.071414284), (1.5, 0))
        make_face()
    extrude(amount=36.853571071, mode=Mode.SUBTRACT)
    with BuildSketch(Plane(origin=(26.426785536, -38.5, -1.5), x_dir=(0, 0, 1), z_dir=(-1, 0, 0))) as fillet_2_piece_3:
        with BuildLine():
            CenterArc((5, 3.570714214), FILLET_2_R, 180, 45.572995999)
            Line((0, 3.570714214), (-0.1, 3.570714214))
            Line((-0.1, 3.570714214), (-0.1, 0))
            Line((-0.1, 0), (0, -0.1))
            ThreePointArc((0, -0.1), (0.75, -0.1), (1.43, -0.071414284))
            Line((1.43, -0.071414284), (1.5, 0))
        make_face()
    extrude(amount=52.33109182, mode=Mode.SUBTRACT)


solid = part.part
